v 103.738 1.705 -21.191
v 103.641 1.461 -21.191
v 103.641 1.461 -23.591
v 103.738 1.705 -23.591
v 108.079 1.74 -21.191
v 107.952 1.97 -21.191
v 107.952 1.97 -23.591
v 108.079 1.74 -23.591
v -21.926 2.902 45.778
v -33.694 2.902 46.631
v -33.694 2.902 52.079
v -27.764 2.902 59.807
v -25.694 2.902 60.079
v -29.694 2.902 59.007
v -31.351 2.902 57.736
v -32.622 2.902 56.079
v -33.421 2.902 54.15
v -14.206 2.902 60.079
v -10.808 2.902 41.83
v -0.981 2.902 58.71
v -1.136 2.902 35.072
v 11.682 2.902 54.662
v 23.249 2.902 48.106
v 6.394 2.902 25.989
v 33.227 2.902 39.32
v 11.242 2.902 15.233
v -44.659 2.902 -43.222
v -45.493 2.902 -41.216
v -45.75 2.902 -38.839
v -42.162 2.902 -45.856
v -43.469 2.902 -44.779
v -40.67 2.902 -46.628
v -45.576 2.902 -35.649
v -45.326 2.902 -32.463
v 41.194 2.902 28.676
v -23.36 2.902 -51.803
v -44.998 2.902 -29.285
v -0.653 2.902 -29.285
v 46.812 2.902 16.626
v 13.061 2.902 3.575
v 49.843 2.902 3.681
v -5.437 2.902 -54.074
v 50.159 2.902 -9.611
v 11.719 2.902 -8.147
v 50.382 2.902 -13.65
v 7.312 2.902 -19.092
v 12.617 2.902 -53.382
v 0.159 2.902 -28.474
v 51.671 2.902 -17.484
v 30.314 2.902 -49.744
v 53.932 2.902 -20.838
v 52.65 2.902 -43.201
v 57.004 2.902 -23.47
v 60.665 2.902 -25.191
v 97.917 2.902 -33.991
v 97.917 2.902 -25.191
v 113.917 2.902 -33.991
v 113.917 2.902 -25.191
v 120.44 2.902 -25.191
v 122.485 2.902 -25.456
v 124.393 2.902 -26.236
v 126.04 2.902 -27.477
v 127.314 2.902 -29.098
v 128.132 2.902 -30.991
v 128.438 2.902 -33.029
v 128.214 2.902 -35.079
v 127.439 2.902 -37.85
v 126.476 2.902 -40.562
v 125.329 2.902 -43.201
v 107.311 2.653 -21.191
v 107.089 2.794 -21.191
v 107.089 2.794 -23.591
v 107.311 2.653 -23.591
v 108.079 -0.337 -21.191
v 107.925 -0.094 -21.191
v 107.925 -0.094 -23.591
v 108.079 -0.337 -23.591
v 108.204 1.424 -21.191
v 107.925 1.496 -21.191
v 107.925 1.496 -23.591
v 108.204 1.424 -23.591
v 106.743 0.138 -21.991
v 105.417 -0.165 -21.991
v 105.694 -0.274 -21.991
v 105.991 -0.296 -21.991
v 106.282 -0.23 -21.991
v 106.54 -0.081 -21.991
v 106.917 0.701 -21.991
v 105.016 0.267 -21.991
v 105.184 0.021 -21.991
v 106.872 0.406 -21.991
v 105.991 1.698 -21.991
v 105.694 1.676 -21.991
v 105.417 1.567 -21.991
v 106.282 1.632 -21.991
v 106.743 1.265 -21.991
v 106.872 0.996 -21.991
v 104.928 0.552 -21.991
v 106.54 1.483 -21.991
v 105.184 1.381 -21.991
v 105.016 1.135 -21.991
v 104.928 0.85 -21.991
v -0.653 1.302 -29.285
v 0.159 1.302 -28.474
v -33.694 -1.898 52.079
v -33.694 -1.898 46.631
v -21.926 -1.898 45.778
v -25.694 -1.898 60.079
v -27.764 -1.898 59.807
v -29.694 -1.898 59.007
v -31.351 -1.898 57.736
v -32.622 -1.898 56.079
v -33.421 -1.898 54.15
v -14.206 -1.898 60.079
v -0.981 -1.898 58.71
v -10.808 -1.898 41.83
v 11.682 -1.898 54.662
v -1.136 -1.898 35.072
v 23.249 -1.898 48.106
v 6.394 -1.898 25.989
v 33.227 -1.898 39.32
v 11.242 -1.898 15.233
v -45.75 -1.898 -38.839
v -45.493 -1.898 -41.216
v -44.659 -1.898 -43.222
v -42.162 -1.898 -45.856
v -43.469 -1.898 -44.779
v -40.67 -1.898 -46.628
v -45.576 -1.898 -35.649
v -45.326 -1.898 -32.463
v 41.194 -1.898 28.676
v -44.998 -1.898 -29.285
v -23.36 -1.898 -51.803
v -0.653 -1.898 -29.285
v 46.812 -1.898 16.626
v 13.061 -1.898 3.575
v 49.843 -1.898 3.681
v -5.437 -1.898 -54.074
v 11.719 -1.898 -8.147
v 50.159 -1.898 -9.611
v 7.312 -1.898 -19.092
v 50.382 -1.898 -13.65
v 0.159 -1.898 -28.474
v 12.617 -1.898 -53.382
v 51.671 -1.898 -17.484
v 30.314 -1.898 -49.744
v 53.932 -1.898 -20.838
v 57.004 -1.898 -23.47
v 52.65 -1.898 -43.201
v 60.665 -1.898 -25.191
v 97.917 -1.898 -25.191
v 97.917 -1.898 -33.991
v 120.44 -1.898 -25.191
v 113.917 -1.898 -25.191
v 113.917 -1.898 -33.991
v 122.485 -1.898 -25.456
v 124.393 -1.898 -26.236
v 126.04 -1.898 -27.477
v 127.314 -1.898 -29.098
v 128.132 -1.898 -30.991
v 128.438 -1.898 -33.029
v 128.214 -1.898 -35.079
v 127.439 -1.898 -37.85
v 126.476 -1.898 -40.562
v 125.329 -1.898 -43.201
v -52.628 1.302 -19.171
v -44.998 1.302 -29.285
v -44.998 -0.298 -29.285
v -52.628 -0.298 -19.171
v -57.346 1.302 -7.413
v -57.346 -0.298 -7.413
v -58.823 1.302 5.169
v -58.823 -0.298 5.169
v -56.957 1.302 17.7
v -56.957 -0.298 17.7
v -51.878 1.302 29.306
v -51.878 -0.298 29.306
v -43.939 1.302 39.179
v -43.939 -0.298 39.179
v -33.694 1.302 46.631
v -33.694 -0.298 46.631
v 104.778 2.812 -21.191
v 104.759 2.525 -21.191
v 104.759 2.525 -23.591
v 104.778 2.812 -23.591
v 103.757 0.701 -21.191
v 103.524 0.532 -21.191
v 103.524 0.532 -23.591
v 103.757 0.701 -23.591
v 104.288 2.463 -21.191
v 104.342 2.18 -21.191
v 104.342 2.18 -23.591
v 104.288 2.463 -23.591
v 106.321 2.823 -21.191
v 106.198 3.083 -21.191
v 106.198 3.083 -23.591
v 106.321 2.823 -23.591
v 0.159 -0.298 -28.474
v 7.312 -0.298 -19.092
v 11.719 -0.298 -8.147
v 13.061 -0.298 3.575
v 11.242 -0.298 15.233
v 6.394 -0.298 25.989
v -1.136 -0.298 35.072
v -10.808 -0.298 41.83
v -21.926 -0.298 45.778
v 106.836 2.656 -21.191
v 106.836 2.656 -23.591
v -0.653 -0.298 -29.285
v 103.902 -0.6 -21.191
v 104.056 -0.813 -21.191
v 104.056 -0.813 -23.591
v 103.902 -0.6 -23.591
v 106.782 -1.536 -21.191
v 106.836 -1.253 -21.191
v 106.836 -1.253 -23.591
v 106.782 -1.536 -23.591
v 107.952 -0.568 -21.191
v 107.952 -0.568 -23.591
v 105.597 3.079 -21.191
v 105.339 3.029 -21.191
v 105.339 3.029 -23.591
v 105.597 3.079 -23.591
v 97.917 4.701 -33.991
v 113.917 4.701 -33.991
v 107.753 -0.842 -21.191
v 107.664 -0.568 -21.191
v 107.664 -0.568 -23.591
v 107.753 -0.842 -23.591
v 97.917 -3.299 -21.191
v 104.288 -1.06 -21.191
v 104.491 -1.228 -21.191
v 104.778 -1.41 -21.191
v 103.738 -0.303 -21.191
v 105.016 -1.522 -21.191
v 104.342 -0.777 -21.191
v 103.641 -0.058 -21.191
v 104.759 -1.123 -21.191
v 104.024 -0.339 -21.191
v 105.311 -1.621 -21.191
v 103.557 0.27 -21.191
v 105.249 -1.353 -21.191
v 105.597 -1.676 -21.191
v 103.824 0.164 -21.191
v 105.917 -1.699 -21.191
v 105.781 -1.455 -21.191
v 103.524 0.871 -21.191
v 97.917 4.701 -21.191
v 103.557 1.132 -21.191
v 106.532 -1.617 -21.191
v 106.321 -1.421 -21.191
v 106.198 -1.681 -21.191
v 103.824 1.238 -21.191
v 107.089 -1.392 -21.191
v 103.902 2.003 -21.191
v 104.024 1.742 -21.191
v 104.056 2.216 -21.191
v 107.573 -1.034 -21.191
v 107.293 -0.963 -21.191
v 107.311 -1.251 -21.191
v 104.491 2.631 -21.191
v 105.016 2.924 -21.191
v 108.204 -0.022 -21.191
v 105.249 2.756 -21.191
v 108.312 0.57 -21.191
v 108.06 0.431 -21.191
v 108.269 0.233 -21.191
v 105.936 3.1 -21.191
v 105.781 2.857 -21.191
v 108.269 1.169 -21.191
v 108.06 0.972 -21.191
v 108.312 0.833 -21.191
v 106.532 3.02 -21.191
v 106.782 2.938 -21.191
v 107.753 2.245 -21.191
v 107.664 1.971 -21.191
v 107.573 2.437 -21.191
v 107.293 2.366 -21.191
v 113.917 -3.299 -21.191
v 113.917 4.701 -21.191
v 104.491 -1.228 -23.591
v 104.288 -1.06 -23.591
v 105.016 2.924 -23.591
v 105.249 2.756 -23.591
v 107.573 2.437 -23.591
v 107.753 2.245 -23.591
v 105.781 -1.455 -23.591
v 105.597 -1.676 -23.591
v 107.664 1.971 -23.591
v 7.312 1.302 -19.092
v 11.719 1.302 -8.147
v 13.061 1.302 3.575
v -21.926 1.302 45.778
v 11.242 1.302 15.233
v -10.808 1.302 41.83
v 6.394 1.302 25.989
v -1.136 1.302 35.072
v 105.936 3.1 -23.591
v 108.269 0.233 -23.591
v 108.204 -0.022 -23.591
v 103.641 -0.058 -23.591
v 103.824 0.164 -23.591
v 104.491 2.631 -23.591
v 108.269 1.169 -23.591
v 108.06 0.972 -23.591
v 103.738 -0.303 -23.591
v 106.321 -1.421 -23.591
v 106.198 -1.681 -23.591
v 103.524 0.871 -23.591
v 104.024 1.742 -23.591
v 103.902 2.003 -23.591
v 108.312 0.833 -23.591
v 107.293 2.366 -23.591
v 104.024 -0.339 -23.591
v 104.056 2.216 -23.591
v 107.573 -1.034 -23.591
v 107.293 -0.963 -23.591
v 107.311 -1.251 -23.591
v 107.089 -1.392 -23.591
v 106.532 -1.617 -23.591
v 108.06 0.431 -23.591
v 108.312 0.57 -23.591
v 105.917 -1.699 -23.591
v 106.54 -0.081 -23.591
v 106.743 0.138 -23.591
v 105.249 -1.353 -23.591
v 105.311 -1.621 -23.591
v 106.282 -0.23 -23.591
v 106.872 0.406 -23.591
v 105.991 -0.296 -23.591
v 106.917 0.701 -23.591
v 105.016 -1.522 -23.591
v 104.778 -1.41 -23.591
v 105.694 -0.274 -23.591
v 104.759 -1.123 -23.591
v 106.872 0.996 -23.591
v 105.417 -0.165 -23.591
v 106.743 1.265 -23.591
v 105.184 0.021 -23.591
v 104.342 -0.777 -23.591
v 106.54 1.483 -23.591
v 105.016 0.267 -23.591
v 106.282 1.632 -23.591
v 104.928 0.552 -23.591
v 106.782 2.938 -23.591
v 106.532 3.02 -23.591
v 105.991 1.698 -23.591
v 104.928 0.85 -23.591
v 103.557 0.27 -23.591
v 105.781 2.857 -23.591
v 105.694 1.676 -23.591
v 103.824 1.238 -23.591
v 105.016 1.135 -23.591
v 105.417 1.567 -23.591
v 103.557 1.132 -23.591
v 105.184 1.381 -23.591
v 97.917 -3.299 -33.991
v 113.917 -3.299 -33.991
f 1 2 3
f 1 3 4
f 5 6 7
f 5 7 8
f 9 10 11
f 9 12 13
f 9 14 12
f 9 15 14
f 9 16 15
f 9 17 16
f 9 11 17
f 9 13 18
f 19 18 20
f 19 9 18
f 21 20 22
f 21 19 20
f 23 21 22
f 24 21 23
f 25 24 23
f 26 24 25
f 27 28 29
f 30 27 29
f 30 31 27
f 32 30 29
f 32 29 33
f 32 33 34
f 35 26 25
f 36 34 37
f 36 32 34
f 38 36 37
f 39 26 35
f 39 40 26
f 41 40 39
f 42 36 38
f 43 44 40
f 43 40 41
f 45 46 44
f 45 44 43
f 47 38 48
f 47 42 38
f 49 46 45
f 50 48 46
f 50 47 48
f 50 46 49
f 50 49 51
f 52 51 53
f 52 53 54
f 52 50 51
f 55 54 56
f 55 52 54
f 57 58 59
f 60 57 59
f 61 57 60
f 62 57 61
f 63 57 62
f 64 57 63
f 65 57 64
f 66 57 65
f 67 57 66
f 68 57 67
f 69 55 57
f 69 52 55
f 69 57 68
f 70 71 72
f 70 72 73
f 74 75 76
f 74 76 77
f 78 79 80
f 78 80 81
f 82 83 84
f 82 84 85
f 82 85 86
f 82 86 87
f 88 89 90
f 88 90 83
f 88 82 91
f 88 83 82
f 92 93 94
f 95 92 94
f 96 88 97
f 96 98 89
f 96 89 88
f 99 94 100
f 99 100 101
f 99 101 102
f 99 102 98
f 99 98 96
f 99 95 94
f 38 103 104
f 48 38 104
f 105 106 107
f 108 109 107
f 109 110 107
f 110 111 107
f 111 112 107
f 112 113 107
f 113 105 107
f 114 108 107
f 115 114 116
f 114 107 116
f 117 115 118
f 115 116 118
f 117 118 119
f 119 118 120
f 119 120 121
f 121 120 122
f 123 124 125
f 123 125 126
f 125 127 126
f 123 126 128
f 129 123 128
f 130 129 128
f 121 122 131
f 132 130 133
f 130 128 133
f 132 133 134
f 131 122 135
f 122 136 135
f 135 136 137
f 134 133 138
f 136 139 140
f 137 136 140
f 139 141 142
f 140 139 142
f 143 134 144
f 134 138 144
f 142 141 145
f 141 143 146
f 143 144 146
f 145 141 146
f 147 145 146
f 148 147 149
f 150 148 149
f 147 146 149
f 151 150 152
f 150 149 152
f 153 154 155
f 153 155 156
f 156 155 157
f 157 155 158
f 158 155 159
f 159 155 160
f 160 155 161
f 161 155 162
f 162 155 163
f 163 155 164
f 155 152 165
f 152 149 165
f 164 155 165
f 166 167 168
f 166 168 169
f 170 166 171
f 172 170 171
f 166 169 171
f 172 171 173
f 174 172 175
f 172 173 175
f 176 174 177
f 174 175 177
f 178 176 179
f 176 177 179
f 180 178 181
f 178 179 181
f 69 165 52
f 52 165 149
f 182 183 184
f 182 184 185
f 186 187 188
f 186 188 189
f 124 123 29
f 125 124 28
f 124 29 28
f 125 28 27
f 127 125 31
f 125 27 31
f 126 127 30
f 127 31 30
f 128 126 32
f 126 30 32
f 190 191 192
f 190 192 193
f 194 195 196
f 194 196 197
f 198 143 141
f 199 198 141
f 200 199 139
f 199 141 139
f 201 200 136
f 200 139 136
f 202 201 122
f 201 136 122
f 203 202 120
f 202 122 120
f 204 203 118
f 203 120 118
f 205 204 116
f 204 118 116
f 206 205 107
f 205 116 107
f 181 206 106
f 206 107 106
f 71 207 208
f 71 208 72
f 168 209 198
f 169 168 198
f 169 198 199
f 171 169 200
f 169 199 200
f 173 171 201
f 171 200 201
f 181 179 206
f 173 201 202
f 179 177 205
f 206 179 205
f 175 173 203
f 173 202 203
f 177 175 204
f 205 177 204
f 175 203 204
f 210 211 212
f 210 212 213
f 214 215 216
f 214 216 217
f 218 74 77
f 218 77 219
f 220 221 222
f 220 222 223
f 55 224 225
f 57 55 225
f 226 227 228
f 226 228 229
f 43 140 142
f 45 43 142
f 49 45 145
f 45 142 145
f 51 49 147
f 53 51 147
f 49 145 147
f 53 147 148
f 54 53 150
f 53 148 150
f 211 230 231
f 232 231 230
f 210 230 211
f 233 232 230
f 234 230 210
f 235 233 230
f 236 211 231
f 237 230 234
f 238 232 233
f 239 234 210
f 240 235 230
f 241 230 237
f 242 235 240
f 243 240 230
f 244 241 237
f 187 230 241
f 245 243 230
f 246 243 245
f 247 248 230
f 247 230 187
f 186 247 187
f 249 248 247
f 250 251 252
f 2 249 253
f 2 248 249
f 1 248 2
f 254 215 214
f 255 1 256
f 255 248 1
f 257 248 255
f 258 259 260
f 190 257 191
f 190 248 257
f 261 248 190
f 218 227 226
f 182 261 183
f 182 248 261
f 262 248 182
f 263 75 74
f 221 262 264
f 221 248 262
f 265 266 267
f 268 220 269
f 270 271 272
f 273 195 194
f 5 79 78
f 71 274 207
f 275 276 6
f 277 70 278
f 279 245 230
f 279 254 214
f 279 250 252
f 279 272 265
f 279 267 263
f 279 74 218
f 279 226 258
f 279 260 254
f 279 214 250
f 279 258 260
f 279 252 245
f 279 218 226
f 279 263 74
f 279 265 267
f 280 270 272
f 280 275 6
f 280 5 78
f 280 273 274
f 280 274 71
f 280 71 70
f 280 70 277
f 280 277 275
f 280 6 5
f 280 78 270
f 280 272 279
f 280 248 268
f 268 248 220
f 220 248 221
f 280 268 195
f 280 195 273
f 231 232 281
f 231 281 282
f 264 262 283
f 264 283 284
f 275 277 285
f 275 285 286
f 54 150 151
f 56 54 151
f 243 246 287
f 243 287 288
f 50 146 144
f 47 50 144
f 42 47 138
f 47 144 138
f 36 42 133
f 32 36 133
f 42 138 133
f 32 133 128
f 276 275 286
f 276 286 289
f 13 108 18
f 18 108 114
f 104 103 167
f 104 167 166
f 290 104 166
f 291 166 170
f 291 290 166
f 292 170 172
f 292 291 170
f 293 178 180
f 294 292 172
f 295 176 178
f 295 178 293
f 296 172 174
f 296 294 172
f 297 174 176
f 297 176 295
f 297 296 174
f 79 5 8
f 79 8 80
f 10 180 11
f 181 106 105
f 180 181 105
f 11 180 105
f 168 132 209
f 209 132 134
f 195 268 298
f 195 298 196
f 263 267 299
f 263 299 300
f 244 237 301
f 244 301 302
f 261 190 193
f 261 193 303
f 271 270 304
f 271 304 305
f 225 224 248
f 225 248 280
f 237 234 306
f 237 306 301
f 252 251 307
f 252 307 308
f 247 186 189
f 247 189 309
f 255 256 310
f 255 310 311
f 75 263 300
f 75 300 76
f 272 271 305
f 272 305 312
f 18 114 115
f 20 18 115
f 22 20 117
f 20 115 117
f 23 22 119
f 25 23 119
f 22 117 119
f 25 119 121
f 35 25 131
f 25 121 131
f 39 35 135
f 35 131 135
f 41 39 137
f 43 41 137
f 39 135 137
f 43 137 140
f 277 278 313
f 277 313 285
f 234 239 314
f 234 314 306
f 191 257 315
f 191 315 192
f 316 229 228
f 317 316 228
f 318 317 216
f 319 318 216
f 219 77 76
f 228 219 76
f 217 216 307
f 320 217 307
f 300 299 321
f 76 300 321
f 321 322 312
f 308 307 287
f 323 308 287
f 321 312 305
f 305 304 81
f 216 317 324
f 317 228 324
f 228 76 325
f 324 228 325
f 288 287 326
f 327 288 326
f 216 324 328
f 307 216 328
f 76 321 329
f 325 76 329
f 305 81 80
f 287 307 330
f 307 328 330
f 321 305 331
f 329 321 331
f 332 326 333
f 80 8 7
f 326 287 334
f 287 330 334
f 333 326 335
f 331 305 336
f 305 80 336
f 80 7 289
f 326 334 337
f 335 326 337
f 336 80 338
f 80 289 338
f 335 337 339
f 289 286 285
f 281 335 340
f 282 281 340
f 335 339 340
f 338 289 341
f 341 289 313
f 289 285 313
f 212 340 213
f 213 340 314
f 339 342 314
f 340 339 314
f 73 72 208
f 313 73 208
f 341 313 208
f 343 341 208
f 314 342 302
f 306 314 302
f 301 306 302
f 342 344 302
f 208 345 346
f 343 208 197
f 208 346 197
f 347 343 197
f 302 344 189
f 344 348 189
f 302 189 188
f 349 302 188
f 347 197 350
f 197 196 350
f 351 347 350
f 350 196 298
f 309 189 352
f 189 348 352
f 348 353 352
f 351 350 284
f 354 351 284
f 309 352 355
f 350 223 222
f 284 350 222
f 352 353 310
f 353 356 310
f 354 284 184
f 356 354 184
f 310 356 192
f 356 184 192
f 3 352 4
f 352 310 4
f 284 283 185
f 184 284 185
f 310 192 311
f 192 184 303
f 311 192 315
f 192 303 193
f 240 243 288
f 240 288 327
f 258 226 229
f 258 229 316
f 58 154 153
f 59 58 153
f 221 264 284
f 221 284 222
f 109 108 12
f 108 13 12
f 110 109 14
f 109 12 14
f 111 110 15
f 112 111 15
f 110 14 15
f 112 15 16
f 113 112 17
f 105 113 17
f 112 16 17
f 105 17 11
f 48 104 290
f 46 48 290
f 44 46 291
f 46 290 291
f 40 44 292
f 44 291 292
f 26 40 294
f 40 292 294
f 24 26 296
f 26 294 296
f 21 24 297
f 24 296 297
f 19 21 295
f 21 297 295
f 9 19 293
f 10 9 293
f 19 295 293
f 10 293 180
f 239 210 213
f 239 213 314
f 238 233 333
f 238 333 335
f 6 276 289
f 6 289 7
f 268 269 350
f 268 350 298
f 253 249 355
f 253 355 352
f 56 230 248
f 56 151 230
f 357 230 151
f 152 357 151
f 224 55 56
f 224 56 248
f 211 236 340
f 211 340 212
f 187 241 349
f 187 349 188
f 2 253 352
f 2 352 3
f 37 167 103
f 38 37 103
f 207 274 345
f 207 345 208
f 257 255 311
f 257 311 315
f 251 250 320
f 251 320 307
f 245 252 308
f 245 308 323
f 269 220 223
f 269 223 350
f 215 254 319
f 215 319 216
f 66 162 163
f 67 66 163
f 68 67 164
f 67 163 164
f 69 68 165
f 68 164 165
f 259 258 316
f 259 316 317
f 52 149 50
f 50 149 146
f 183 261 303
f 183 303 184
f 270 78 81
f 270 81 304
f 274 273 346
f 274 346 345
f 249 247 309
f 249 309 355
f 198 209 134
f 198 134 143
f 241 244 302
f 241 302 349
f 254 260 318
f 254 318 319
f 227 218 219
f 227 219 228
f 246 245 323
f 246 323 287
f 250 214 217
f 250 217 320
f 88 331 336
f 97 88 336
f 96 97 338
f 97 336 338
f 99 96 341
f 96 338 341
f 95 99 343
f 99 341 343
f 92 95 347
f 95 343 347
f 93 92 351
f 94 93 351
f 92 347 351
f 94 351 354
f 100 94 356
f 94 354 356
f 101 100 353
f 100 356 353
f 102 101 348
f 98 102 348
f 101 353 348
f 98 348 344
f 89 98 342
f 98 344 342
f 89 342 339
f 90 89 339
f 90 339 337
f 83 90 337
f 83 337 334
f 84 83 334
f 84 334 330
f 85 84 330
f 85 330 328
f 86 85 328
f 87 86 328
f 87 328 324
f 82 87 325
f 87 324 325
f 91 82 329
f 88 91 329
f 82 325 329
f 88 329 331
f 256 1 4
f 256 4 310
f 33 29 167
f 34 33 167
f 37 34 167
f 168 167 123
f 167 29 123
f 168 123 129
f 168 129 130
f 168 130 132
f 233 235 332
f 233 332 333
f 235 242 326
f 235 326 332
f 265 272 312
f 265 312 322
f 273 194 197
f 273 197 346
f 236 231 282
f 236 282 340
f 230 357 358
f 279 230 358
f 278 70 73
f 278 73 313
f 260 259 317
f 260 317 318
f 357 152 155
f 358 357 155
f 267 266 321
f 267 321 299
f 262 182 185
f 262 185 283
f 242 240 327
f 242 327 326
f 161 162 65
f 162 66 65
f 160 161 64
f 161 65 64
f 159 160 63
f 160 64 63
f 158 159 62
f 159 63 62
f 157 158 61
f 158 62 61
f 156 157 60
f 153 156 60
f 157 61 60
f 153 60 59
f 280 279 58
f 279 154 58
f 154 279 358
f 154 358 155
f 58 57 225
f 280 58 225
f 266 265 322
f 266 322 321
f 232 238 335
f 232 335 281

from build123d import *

# Parameters (mm, degrees)
SKETCH2_R                = 30
BOSS_EXTRUDE1_DEPTH      = 1
BOSS_EXTRUDE2_DEPTH      = 1
BOSS_EXTRUDE2_DEPTH_BACK = 2
SCALE1_SCALE             = 2
BOSS_EXTRUDE3_DEPTH      = 5
BOSS_EXTRUDE3_DEPTH_BACK = 11
SKETCH5_W                = 20
SKETCH5_H                = 10
FILLET1_R                = 10
FILLET2_R                = 10
FILLET3_R                = 10
CUT_EXTRUDE3_DEPTH       = 3
SKETCH13_R               = 1.25
BOSS_EXTRUDE4_DEPTH      = 2
SCALE2_SCALE             = 0.8


with BuildPart() as part:
    # Sketch2 → Boss-Extrude1 (new body)
    with BuildSketch(Plane(origin=(0, 0, 0), x_dir=(1, 0, 0), z_dir=(0, 1, 0))):
        with Locations(Location((0, 0, 0), (0, 0, 270))):
            Circle(SKETCH2_R)
    extrude(amount=BOSS_EXTRUDE1_DEPTH)

    # Sketch3 → Boss-Extrude2 (add, two sides: drawn at the far end of the back side and taken through both)
    with BuildSketch(Plane(origin=(0, 1, 0), x_dir=(1, 0, 0), z_dir=(0, 1, 0)).offset(-BOSS_EXTRUDE2_DEPTH_BACK)):
        with BuildLine():
            Line((-14.290451106, -26.37769905), (-14.290451106, -34.782711282))
            Line((-14.290451106, -34.782711282), (-2.11058873, -34.782711282))
            ThreePointArc((-2.11058873, -34.782711282), (27.5349766, -21.80785282), (38.117480018, 8.773466924))
            ThreePointArc((38.117480018, 8.773466924), (39.698443789, 14.79025178), (44.684067377, 18.511098982))
            Line((44.684067377, 18.511098982), (87.64168842, 18.511098982))
            ThreePointArc((87.64168842, 18.511098982), (86.998038921, 24.281089627), (85.098734122, 29.767410617))
            Line((85.098734122, 29.767410617), (39.674176802, 29.767410617))
            Line((39.674176802, 29.767410617), (25.714146622, 33.856712387))
            ThreePointArc((25.714146622, 33.856712387), (1.610609717, 36.463459714), (-21.899290339, 30.542292401))
            ThreePointArc((-21.899290339, 30.542292401), (-21.763636639, 25.798277328), (-21.355544159, 21.069901131))
            Line((-21.355544159, 21.069901131), (6.360164673, 21.069901131))
            Line((6.360164673, 21.069901131), (6.867267346, 20.563219729))
            ThreePointArc((6.867267346, 20.563219729), (12.505714755, -10.216879454), (-14.290451106, -26.37769905))
        make_face()
    extrude(amount=BOSS_EXTRUDE2_DEPTH + BOSS_EXTRUDE2_DEPTH_BACK)


with BuildPart() as part_1:
    # Scale1: scaled about (18.795730072, 0.5, -7.565232671)
    add(part.part.scale(SCALE1_SCALE).moved(Location((-18.795730072, -0.5, 7.565232671))))

    # Sketch5 → Boss-Extrude3 (add, two sides: drawn at the far end of the back side and taken through both)
    with BuildSketch(Plane.XY.offset(-29.456965293).offset(-BOSS_EXTRUDE3_DEPTH_BACK)):
        with Locations((127.136416626, 0.749159319)):
            Rectangle(SKETCH5_W, SKETCH5_H)
    extrude(amount=BOSS_EXTRUDE3_DEPTH + BOSS_EXTRUDE3_DEPTH_BACK)

    # Fillet1
    fillet1_edges = [part_1.edges().sort_by_distance(p)[0] for p in [
        (-47.376632285, 0.5, 77.130655235),
    ]]
    fillet(fillet1_edges, radius=FILLET1_R)

    # Fillet2
    fillet2_edges = [part_1.edges().sort_by_distance(p)[0] for p in [
        (-62.59431075, 0.5, -53.519352131),
    ]]
    fillet(fillet2_edges, radius=FILLET2_R)

    # Fillet3
    fillet3_edges = [part_1.edges().sort_by_distance(p)[0] for p in [
        (156.487646768, 0.5, -29.456965293),
    ]]
    fillet(fillet3_edges, radius=FILLET3_R)

    # Sketch12 → Cut-Extrude3 (cut)
    with BuildSketch(Plane.XY.offset(-24.456965293)):
        Polygon((124.436416626, 0.749159319), (124.145484747, 0.961193849), (124.186719528, 1.287600755), (124.521242091, 1.420622015), (124.292181215, 1.698346906), (124.413294627, 2.004244466), (124.770388589, 2.049894239), (124.617591455, 2.375859016), (124.810973495, 2.64202656), (125.168201332, 2.597436505), (125.101268743, 2.951159601), (125.354768508, 3.160872845), (125.689684279, 3.028844718), (125.712821858, 3.38810041), (126.010511024, 3.528182299), (126.302070741, 3.317011913), (126.413824668, 3.659226845), (126.736998331, 3.720875519), (126.966882223, 3.443831486), (127.160230587, 3.747503035), (127.488582557, 3.72684488), (127.642346175, 3.401334896), (127.905140188, 3.647382262), (128.218038903, 3.545715307), (128.286020713, 3.192192361), (128.601748061, 3.365155483), (128.879532943, 3.188867836), (128.857461398, 2.829545075), (129.20628377, 2.918556044), (129.431500575, 2.678724506), (129.32076251, 2.3361795), (129.680762114, 2.33564543), (129.839259641, 2.047339499), (129.646813137, 1.743095611), (129.995369874, 1.653050059), (130.07718914, 1.334385057), (129.815126319, 1.08755905), (130.130339086, 0.913659908), (130.130339086, 0.58465873), (129.815126319, 0.410759589), (130.07718914, 0.163933581), (129.995369874, -0.15473142), (129.646813137, -0.244776973), (129.839259641, -0.549020861), (129.680762114, -0.837326791), (129.32076251, -0.837860862), (129.431500575, -1.180405868), (129.20628377, -1.420237405), (128.857461398, -1.331226436), (128.879532943, -1.690549198), (128.601748061, -1.866836845), (128.286020713, -1.693873722), (128.218038903, -2.047396669), (127.905140188, -2.149063624), (127.642346175, -1.903016258), (127.488582557, -2.228526242), (127.136416626, -2.250840681), (126.966882223, -1.945512848), (126.736998331, -2.22255688), (126.379896011, -2.153886764), (126.302070741, -1.818693275), (126.010511024, -2.029863661), (125.712821858, -1.889781772), (125.689684279, -1.53052608), (125.354768508, -1.662554207), (125.101268743, -1.452840963), (125.168201332, -1.099117867), (124.810973495, -1.143707922), (124.617591455, -0.877540378), (124.770388589, -0.551575601), (124.413294627, -0.505925827), (124.292181215, -0.200028268), (124.521242091, 0.077696624), (124.186719528, 0.210717883), (124.145484747, 0.537124789), align=None)
    extrude(amount=-CUT_EXTRUDE3_DEPTH, mode=Mode.SUBTRACT)

    # Sketch13 → Boss-Extrude4 (add)
    with BuildSketch(Plane.XY.offset(-27.456965293)):
        with Locations((127.136416626, 0.749159319)):
            Circle(SKETCH13_R)
    extrude(amount=BOSS_EXTRUDE4_DEPTH)


with BuildPart() as part_2:
    # Scale2: scaled about (21.037420475, 0.509511918, -8.126150546)
    add(part_1.part.scale(SCALE2_SCALE).moved(Location((4.207484095, 0.101902384, -1.625230109))))


solid = part_2.part
